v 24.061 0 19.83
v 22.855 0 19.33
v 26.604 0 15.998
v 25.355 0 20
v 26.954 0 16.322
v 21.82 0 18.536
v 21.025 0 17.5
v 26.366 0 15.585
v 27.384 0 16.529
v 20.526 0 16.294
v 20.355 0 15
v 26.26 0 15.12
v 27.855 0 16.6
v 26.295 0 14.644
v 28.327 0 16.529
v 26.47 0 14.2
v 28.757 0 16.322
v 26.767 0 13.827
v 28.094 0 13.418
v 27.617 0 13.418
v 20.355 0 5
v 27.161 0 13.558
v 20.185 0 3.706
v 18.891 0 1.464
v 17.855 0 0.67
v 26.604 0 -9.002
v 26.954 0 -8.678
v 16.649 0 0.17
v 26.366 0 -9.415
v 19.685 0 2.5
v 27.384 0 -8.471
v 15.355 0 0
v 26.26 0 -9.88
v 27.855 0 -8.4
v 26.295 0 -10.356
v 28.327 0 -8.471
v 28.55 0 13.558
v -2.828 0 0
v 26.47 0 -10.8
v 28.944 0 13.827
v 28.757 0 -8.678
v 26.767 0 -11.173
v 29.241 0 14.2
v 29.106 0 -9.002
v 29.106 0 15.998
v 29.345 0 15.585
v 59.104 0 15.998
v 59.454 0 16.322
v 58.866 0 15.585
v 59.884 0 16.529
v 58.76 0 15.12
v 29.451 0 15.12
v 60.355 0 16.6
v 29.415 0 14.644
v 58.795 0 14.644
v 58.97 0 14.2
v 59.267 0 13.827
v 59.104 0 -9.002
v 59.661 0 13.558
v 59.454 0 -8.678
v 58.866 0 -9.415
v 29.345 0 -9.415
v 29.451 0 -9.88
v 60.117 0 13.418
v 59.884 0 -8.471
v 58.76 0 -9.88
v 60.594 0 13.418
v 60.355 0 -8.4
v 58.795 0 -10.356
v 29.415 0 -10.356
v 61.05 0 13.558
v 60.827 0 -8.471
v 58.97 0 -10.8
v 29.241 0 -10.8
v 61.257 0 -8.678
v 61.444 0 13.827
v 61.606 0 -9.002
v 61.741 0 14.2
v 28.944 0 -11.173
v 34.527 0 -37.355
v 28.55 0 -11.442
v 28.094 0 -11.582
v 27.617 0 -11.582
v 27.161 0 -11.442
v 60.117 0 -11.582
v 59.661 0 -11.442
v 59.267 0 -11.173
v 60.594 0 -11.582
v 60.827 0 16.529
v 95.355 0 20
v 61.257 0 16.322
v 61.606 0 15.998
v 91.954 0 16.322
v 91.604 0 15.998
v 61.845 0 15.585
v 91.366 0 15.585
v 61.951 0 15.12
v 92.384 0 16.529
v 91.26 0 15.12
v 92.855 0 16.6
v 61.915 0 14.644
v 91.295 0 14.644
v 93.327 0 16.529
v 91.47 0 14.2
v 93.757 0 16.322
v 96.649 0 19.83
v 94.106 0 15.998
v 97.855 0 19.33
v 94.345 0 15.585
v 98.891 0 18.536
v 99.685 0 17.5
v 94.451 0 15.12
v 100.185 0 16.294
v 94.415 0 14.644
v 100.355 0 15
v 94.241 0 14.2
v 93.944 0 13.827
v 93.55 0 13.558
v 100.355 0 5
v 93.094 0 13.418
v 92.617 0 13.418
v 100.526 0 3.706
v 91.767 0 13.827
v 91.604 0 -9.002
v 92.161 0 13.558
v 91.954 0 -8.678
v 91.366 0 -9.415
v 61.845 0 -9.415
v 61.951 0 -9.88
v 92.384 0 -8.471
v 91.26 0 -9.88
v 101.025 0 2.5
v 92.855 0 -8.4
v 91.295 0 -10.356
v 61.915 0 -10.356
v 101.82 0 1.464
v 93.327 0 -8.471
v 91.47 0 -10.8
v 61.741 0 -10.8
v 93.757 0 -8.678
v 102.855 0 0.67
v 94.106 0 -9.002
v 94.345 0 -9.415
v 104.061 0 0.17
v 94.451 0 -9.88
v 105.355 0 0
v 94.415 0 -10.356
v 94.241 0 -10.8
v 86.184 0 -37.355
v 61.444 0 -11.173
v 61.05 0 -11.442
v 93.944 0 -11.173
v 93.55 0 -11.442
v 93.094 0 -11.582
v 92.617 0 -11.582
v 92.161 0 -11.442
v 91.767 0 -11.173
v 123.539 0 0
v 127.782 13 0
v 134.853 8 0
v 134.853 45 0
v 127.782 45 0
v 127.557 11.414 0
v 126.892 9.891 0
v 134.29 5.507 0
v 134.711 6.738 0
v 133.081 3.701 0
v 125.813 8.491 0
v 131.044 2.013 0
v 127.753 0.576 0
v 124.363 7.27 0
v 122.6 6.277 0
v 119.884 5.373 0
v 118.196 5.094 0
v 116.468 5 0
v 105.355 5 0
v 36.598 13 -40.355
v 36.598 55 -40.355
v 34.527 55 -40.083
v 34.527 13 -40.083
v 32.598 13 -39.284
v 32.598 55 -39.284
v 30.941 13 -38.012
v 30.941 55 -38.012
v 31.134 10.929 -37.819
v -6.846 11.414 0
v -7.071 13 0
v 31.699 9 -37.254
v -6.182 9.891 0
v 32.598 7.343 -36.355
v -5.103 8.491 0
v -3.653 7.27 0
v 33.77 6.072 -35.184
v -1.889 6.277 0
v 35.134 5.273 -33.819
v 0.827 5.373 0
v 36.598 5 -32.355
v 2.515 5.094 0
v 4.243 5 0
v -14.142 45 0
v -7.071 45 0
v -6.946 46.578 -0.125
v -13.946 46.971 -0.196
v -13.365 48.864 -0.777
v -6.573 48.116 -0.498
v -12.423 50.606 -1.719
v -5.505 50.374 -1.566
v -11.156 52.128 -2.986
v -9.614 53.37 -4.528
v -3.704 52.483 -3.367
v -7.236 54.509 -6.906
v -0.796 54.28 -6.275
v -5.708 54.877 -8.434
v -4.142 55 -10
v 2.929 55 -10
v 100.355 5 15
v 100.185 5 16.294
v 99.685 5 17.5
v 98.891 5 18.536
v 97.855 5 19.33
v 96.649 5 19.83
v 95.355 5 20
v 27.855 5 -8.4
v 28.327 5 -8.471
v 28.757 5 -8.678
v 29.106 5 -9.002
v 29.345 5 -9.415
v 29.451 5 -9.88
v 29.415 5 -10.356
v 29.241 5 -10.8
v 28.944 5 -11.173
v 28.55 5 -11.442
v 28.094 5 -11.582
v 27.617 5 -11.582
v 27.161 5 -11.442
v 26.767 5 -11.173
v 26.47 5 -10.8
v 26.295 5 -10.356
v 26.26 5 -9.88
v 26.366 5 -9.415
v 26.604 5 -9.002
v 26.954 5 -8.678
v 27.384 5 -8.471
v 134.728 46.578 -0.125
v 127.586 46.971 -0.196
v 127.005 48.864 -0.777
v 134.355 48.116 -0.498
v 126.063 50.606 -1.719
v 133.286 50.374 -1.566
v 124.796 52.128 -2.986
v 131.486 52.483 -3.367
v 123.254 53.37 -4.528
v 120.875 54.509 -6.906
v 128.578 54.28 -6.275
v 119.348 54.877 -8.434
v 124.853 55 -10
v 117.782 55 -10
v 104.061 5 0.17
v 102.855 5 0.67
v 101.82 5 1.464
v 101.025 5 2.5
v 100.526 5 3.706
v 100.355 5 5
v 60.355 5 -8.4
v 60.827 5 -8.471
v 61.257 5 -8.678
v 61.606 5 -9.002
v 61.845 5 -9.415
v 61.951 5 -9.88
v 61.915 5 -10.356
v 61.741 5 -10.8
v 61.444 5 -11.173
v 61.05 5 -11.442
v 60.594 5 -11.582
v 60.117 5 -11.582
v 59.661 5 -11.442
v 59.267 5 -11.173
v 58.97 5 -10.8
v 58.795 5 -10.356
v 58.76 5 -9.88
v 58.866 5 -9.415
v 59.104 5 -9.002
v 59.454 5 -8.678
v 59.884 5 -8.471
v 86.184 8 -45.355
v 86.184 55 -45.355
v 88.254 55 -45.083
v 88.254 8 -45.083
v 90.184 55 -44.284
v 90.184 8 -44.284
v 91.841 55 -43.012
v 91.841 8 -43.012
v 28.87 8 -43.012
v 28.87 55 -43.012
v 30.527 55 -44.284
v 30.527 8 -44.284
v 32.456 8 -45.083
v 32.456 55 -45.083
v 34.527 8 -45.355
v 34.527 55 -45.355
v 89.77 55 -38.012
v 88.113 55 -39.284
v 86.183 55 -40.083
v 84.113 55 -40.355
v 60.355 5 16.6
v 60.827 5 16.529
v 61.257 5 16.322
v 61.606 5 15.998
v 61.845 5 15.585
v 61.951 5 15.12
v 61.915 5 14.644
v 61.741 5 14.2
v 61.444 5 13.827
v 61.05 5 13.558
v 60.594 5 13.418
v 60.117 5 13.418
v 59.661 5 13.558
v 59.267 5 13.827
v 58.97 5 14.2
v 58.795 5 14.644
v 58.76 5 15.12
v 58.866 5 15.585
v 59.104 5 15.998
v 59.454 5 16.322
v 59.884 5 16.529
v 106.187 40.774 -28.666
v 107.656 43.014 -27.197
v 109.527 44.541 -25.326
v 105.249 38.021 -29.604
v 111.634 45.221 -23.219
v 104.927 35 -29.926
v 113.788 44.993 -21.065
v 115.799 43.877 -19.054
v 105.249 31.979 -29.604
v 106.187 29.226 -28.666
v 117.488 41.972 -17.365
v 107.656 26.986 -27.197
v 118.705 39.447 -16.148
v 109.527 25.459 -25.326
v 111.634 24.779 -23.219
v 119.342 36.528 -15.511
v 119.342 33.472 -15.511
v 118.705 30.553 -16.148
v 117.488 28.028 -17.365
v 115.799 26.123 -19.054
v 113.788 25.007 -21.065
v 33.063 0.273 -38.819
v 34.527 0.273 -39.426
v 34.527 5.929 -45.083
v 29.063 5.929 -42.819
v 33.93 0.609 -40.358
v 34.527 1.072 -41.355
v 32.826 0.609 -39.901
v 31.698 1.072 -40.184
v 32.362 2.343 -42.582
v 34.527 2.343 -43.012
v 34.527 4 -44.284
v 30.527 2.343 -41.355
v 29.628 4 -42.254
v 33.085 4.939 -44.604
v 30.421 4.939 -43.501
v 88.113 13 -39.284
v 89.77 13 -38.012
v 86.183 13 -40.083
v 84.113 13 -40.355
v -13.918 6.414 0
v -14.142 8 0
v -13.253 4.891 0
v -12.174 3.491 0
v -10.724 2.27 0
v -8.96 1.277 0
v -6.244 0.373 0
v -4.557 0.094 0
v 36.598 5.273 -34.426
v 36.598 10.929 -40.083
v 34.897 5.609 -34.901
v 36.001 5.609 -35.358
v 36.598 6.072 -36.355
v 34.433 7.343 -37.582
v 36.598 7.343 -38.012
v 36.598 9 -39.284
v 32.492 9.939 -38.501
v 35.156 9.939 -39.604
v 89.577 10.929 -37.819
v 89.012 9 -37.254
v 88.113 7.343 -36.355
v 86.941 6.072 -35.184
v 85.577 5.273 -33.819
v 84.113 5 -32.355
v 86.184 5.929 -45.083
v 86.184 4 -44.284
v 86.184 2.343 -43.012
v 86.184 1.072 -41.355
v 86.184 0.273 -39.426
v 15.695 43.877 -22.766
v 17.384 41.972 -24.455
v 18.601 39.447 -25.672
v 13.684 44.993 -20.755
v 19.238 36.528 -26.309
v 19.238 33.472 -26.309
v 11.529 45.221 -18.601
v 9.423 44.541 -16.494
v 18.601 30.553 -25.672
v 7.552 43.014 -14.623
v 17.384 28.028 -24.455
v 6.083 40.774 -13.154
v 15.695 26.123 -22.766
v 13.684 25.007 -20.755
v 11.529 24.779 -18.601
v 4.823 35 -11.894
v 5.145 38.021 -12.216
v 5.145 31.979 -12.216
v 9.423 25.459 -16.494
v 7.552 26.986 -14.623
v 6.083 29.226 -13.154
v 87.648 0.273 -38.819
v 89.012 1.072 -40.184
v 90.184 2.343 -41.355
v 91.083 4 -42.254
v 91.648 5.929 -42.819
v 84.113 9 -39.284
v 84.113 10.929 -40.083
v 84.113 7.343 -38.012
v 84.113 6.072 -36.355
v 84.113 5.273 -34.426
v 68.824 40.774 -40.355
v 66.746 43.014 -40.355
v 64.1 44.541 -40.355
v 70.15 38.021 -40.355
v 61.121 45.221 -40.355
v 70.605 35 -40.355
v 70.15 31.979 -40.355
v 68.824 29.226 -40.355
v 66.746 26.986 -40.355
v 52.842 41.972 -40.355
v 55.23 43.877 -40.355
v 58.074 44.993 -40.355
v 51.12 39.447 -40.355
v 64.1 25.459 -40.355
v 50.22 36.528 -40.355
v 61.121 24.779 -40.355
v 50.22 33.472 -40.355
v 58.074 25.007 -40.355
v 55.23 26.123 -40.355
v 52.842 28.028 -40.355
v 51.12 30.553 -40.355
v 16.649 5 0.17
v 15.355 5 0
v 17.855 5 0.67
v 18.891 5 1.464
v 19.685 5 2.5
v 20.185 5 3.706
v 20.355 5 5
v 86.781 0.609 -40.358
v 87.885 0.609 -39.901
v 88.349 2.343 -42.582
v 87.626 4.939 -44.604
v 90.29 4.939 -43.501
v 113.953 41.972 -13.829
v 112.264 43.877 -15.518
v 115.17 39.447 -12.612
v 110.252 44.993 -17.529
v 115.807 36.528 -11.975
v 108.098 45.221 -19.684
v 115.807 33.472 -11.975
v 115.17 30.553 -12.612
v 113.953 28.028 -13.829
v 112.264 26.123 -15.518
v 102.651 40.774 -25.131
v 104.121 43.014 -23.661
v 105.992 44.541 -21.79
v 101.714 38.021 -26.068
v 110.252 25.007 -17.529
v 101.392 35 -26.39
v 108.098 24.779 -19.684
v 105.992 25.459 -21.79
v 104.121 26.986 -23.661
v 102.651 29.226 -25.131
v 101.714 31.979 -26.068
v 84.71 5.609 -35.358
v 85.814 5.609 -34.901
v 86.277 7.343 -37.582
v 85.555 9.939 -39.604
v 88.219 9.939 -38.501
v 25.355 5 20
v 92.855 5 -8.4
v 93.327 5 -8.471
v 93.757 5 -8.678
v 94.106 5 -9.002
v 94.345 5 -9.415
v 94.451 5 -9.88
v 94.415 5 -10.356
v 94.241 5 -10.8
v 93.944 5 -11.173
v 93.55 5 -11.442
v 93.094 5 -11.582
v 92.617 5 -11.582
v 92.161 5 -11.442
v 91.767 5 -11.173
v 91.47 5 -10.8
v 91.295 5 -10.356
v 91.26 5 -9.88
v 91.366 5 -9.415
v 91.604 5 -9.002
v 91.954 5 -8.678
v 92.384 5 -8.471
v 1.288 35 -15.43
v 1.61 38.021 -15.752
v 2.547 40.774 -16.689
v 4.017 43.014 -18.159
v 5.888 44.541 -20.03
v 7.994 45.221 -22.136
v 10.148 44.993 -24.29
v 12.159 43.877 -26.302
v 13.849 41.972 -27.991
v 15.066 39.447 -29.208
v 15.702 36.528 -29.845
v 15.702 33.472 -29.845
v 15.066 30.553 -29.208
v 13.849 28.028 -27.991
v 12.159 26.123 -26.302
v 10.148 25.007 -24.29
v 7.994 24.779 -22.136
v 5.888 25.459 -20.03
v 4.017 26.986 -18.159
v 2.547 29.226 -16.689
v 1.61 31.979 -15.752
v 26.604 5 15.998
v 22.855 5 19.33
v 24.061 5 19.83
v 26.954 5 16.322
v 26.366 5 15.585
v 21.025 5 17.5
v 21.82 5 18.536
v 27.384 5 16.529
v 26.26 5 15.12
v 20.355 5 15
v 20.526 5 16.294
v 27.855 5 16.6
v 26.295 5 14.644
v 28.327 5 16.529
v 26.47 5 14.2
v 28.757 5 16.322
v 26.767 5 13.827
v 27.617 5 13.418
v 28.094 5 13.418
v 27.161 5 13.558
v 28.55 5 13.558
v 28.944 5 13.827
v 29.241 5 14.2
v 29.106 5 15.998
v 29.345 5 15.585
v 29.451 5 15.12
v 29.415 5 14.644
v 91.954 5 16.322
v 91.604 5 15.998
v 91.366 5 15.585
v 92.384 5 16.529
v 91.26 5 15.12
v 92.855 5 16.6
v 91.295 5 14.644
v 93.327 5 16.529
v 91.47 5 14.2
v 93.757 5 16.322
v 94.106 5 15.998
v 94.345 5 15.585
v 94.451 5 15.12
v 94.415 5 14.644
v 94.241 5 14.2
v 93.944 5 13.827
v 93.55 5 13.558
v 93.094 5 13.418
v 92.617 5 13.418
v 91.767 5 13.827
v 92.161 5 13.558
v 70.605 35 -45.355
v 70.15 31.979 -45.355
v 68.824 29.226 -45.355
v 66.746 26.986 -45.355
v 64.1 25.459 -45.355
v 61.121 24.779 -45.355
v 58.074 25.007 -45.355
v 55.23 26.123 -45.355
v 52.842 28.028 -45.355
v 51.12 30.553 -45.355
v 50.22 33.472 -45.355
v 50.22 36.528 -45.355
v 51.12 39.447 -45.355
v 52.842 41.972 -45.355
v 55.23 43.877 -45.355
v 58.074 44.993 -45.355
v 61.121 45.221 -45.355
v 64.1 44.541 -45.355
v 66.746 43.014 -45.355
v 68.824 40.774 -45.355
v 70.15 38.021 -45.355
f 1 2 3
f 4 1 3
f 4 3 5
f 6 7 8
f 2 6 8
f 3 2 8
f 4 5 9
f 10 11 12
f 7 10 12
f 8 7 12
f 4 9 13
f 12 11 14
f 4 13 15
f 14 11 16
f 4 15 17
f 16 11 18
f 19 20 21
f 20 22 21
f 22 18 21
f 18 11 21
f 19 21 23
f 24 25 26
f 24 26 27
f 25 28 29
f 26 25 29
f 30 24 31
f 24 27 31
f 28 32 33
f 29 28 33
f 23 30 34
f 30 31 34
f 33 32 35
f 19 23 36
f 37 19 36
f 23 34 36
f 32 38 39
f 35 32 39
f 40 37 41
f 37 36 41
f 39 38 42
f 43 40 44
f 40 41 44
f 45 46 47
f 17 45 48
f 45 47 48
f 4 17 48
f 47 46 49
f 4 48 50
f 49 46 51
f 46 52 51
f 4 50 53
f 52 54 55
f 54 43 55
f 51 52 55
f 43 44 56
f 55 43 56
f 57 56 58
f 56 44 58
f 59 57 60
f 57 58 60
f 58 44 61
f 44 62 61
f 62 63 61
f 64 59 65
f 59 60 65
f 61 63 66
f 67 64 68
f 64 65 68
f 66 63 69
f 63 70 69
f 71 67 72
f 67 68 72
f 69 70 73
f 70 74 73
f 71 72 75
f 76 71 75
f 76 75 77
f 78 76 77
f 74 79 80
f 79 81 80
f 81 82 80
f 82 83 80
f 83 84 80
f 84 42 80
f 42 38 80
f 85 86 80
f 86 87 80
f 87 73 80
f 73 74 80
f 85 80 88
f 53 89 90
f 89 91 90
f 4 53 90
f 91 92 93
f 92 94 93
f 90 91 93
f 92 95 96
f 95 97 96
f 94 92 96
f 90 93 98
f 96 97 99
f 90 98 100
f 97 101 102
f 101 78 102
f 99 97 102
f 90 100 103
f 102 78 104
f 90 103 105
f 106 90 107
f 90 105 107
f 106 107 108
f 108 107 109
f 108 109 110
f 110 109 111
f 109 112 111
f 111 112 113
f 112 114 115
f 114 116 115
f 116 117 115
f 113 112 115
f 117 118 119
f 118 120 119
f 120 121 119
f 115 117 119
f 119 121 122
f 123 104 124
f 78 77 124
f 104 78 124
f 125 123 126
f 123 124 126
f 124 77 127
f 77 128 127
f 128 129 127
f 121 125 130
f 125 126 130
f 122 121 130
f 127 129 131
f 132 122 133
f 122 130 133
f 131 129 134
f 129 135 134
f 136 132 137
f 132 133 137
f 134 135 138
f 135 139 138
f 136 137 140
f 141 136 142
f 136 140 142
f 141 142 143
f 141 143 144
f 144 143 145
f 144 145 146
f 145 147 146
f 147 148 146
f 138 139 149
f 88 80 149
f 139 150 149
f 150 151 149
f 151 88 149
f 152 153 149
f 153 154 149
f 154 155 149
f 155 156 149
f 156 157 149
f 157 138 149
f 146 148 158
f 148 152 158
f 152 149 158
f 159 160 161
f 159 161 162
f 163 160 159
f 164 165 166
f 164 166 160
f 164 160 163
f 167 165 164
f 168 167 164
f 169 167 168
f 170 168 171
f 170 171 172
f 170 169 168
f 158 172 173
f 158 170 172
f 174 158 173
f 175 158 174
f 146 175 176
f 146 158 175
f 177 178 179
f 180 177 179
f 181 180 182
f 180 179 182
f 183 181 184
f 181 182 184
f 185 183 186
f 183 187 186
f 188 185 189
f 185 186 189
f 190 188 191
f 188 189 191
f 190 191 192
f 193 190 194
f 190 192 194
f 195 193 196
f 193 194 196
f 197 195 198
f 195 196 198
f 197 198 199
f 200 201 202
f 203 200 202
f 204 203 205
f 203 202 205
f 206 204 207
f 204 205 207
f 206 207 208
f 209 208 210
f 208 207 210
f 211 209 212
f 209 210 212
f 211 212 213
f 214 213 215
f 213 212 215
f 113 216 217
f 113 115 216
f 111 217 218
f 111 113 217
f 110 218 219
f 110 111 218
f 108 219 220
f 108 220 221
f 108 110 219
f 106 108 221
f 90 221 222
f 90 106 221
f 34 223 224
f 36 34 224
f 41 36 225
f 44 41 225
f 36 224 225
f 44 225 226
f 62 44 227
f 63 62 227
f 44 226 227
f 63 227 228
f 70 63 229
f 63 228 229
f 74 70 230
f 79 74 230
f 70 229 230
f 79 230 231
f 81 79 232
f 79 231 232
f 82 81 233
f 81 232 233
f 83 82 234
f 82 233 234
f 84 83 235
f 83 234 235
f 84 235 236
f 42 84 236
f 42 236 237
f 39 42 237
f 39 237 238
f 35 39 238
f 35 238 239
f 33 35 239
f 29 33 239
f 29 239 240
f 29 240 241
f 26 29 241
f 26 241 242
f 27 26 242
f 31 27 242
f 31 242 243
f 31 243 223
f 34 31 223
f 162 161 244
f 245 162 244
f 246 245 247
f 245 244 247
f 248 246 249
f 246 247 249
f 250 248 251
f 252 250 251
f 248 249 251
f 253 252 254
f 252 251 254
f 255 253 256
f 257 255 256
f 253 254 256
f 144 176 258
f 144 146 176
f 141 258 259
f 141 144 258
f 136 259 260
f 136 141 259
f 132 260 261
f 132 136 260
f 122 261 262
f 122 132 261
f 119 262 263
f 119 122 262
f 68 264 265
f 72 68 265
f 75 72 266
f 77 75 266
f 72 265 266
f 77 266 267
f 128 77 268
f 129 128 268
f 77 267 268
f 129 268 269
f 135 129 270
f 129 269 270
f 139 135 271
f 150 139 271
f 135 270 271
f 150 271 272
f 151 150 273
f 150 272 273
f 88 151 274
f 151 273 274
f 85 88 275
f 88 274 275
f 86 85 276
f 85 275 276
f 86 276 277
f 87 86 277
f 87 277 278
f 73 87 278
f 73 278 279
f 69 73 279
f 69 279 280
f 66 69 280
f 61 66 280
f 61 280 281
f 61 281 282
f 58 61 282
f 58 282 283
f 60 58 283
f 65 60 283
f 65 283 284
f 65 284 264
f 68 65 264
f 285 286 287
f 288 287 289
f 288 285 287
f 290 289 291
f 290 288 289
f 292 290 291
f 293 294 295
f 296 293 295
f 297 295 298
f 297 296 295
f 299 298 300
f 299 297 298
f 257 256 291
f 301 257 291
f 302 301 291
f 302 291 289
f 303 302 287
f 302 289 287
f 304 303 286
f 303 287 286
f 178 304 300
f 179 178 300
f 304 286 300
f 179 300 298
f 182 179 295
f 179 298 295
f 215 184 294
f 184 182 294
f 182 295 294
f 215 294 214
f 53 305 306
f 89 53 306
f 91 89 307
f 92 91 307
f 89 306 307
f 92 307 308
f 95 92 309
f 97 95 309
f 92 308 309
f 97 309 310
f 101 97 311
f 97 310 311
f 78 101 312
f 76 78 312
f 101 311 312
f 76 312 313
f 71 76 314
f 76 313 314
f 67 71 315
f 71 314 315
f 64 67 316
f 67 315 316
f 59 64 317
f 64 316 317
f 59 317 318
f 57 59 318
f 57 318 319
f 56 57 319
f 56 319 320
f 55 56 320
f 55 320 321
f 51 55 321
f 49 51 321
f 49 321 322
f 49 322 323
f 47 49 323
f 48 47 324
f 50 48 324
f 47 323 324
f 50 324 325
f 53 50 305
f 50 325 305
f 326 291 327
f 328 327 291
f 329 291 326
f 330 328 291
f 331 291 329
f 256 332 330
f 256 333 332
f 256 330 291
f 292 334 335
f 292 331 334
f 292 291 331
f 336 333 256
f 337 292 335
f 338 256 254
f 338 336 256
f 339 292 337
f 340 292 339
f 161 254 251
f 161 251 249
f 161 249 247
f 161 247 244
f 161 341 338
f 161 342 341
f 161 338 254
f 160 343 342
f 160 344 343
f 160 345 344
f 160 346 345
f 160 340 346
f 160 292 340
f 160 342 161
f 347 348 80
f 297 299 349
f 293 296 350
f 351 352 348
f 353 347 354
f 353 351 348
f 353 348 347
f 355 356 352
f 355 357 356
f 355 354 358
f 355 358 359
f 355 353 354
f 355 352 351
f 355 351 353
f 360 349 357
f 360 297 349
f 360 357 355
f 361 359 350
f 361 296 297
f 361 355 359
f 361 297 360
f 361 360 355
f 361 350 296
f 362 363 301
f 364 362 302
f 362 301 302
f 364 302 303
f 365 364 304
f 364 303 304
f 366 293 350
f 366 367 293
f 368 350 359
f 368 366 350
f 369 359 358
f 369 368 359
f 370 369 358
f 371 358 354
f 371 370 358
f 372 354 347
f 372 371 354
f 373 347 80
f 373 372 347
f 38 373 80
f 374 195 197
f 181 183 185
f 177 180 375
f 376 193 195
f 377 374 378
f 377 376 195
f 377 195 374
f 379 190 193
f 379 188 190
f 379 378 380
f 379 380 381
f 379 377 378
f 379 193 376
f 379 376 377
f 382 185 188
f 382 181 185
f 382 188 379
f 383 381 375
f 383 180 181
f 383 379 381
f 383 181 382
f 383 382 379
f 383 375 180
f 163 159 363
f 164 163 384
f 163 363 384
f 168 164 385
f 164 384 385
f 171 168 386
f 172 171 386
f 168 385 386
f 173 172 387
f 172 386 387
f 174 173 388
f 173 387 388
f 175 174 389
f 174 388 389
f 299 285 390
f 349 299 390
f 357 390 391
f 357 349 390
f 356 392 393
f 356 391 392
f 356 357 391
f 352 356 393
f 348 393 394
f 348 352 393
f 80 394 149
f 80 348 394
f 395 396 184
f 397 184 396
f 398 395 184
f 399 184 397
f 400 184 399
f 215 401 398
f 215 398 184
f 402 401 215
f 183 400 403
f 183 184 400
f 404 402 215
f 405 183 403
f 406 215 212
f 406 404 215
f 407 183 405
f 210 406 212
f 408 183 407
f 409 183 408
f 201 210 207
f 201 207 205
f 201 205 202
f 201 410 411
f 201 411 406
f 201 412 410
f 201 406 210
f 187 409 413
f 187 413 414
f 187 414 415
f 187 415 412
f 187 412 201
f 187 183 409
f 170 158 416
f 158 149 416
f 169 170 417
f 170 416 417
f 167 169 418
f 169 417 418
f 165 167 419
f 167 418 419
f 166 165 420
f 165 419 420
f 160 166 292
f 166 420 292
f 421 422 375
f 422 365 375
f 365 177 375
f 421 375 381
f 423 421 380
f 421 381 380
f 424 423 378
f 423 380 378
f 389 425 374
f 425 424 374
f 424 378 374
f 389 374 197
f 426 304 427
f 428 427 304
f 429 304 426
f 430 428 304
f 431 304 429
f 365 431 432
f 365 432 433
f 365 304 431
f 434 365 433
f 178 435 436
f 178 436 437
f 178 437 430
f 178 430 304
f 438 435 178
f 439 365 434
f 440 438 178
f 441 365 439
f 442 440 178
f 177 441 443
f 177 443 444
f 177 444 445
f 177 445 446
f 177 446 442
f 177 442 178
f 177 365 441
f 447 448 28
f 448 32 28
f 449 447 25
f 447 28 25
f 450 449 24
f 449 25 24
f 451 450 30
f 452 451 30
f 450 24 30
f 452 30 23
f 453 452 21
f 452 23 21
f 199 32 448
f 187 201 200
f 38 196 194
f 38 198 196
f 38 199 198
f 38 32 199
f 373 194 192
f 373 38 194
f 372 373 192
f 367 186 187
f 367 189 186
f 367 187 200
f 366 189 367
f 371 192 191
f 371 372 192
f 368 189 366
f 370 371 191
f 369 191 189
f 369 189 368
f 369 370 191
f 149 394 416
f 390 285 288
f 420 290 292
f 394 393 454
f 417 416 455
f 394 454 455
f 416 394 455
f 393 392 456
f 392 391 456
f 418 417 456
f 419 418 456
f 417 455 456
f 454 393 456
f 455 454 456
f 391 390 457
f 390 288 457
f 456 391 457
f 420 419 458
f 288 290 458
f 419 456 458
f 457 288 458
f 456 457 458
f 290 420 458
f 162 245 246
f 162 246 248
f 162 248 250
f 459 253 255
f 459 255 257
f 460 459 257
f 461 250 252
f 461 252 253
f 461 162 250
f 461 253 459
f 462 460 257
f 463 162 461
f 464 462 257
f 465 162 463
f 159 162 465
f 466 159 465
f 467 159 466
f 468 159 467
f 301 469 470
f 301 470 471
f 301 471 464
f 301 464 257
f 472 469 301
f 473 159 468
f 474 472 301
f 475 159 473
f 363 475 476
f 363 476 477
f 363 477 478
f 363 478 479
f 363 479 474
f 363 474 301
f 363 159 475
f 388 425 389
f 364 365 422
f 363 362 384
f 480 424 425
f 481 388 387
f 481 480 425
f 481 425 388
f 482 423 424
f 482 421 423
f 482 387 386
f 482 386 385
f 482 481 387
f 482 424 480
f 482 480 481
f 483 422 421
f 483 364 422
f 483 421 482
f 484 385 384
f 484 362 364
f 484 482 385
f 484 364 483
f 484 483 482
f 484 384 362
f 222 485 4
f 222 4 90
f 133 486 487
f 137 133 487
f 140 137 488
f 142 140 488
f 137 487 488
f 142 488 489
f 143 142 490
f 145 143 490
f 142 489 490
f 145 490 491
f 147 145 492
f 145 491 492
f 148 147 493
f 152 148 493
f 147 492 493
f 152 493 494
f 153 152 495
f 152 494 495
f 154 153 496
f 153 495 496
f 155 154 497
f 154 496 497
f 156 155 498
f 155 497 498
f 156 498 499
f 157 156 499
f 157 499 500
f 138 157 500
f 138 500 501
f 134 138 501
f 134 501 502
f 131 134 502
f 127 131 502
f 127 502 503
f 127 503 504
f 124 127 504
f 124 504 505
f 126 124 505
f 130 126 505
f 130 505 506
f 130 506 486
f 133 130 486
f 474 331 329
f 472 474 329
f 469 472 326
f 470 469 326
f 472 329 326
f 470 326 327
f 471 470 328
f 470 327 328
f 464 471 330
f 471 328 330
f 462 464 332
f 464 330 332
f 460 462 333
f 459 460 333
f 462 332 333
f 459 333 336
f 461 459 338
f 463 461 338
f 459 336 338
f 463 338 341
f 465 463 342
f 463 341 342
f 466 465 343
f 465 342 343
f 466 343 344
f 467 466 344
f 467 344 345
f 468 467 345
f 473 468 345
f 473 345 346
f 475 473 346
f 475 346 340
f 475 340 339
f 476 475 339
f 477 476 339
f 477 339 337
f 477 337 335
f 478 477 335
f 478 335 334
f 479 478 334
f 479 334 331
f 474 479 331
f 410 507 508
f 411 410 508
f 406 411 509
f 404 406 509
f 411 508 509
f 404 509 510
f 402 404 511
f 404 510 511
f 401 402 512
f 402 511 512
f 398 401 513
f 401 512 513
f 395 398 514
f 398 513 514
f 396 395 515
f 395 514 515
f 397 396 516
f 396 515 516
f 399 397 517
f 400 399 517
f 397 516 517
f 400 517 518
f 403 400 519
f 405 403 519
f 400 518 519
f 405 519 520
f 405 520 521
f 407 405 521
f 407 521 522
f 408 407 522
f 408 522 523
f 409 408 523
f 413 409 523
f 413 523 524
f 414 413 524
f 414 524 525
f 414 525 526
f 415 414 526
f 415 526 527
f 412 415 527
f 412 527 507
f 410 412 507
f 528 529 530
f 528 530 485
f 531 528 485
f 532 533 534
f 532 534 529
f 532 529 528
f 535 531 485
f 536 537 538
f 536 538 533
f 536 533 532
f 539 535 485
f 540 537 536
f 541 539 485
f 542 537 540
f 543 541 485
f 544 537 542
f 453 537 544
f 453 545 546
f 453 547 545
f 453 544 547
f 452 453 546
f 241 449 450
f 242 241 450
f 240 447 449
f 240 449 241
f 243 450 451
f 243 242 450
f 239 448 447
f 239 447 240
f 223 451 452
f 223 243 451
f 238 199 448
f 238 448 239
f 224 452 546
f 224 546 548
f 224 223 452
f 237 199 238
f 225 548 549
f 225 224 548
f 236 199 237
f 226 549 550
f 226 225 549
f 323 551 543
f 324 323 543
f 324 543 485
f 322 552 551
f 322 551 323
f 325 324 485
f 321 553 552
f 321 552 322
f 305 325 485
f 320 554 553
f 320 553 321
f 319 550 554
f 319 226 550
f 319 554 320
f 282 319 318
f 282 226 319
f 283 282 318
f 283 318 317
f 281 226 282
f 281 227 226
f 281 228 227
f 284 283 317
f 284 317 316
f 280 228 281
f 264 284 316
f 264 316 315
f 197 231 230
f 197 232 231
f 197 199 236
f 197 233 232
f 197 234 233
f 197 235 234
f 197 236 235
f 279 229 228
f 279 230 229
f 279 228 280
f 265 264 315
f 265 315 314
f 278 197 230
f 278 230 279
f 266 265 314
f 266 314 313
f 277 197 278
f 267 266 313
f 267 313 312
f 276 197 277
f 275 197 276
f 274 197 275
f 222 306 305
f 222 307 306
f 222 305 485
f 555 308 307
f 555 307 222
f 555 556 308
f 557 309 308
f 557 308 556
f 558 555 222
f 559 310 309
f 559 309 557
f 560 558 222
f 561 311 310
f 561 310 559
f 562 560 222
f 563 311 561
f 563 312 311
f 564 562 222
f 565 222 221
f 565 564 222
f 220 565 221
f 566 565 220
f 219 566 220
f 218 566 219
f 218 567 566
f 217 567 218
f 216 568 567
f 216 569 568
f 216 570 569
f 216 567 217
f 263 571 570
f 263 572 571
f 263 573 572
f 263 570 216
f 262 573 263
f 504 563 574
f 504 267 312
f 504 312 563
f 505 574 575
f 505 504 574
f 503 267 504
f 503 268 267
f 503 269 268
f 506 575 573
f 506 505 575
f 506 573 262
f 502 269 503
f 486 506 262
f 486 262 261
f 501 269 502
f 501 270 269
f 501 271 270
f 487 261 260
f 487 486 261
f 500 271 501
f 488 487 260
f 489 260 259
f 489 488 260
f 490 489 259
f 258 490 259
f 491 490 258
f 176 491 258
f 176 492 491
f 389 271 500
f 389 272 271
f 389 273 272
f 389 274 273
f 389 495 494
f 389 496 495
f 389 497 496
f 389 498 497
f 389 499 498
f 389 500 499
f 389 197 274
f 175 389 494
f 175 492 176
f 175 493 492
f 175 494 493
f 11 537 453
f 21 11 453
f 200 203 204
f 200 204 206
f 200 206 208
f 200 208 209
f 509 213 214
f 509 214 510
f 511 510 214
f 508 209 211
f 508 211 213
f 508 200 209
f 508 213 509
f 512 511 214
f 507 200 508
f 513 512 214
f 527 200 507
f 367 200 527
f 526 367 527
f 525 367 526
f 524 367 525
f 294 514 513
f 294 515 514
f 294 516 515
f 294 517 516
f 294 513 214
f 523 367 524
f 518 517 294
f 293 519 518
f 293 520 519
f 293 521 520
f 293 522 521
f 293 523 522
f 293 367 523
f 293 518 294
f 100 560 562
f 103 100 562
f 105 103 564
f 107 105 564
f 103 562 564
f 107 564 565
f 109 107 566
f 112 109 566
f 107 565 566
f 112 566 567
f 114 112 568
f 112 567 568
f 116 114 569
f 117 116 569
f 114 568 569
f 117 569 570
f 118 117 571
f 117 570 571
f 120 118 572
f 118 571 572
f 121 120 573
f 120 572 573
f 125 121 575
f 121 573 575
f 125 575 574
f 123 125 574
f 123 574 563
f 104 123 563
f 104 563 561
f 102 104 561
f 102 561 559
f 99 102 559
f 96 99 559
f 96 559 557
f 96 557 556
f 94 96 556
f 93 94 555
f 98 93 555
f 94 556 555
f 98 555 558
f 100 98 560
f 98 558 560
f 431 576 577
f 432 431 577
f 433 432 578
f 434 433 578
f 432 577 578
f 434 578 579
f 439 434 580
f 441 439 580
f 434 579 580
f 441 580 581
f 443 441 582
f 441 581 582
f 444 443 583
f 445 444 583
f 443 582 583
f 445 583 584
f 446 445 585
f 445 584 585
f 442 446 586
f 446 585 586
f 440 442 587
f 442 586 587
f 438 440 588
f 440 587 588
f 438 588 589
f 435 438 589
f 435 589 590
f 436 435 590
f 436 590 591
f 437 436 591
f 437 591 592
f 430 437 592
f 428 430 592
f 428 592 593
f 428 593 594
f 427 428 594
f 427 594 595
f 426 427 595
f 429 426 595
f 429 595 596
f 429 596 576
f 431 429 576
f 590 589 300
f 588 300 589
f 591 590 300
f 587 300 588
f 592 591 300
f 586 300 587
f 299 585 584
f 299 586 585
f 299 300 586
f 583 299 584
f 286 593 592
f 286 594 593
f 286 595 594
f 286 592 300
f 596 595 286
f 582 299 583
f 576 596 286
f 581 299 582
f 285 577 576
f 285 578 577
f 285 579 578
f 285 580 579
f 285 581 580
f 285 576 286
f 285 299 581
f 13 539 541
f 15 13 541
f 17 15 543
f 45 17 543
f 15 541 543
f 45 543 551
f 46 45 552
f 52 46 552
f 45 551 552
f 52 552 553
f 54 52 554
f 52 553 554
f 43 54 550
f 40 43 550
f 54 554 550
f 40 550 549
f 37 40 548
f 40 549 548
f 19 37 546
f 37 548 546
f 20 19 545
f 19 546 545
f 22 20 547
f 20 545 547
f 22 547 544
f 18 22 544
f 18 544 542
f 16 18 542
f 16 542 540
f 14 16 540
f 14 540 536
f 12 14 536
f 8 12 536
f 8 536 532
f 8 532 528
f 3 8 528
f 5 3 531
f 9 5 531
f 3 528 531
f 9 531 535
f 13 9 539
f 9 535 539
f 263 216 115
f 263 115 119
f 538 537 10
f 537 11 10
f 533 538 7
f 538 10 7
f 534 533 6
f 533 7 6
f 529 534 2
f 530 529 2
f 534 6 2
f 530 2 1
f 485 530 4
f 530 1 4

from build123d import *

# Parameters (mm, degrees)
BOSS_EXTRUDE1_DEPTH = 5
BOSS_EXTRUDE2_DEPTH = 50
CUT_EXTRUDE1_DEPTH  = 10
SKETCH6_R           = 10.25
CUT_EXTRUDE2_DEPTH  = 10
SKETCH7_R           = 10.25
CUT_EXTRUDE3_DEPTH  = 10
SKETCH8_R           = 1.6
CUT_EXTRUDE4_DEPTH  = 10
FILLET1_R           = 8
SKETCH10_W          = 80
SKETCH10_H          = 20
SKETCH10_R          = 1.6
BOSS_EXTRUDE5_DEPTH = 5
FILLET4_R           = 5
FILLET5_R           = 10


with BuildPart() as part:
    # Sketch2 → Boss-Extrude1 (new body)
    with BuildSketch(Plane(origin=(0, 0, 0), x_dir=(1, 0, 0), z_dir=(0, 1, 0))):
        Polygon((-14.142135624, 0), (0, 0), (35.355339059, 35.355339059), (85.355339059, 35.355339059), (120.710678119, 0), (134.852813742, 0), (89.497474683, 45.355339059), (31.213203436, 45.355339059), align=None)
        Polygon((85.355339059, 35.355339059), (35.355339059, 35.355339059), (0, 0), (120.710678119, 0), align=None)
    extrude(amount=BOSS_EXTRUDE1_DEPTH)

    # Sketch3 → Boss-Extrude2 (add)
    with BuildSketch(Plane(origin=(0, 5, 0), x_dir=(1, 0, 0), z_dir=(0, 1, 0))):
        Polygon((-14.142135624, 0), (31.213203436, 45.355339059), (89.497474683, 45.355339059), (134.852813742, 0), (127.781745931, 0), (87.426406871, 40.355339059), (33.284271247, 40.355339059), (-7.071067812, 0), align=None)
    extrude(amount=BOSS_EXTRUDE2_DEPTH)

    # Sketch5 → Cut-Extrude1 (cut)
    with BuildSketch(Plane(origin=(0, 0, -45.355339059), x_dir=(-1, 0, 0), z_dir=(0, 0, -1))):
        with BuildLine():
            ThreePointArc((-50.105339059, 35), (-60.355339059, 45.25), (-70.605339059, 35))
            Line((-70.605339059, 35), (-50.105339059, 35))
        make_face()
        with BuildLine():
            Line((-50.105339059, 35), (-70.605339059, 35))
            ThreePointArc((-70.605339059, 35), (-60.355339059, 24.75), (-50.105339059, 35))
        make_face()
    extrude(amount=-CUT_EXTRUDE1_DEPTH, mode=Mode.SUBTRACT)

    # Sketch6 → Cut-Extrude2 (cut)
    with BuildSketch(Plane(origin=(67.426406871, 0, -67.426406871), x_dir=(-0.7071067811865509, 0, -0.7071067811865441), z_dir=(0.7071067811865441, 0, -0.7071067811865509))):
        with Locations((-63.284271247, 35)):
            Circle(SKETCH6_R)
    extrude(amount=-CUT_EXTRUDE2_DEPTH, mode=Mode.SUBTRACT)

    # Sketch7 → Cut-Extrude3 (cut)
    with BuildSketch(Plane(origin=(-7.071067812, 0, -7.071067812), x_dir=(-0.7071067811865513, 0, 0.7071067811865438), z_dir=(-0.7071067811865438, 0, -0.7071067811865513))):
        with Locations((-22.071067812, 35)):
            Circle(SKETCH7_R)
    extrude(amount=-CUT_EXTRUDE3_DEPTH, mode=Mode.SUBTRACT)

    # Sketch8 → Cut-Extrude4 (cut)
    with BuildSketch(Plane(origin=(0, 5, 0), x_dir=(1, 0, 0), z_dir=(0, 1, 0))):
        with Locations(Location((60.355339059, 10, 0), (0, 0, 270))):
            Circle(SKETCH8_R)
        with Locations(Location((92.855339059, 10, 0), (0, 0, 270))):
            Circle(SKETCH8_R)
        with Locations(Location((27.855339059, 10, 0), (0, 0, 270))):
            Circle(SKETCH8_R)
    extrude(amount=-CUT_EXTRUDE4_DEPTH, mode=Mode.SUBTRACT)

    # Fillet1
    fillet1_edges = [part.edges().sort_by_distance(p)[0] for p in [
        (13.106601718, 5, -20.17766953),
        (60.355339059, 5, -40.355339059),
        (33.284271247, 30, -40.355339059),
        (107.604076401, 5, -20.17766953),
        (87.426406871, 30, -40.355339059),
        (60.355339059, 0, -45.355339059),
        (112.175144213, 0, -22.67766953),
        (8.535533906, 0, -22.67766953),
        (31.213203436, 27.5, -45.355339059),
        (89.497474683, 27.5, -45.355339059),
    ]]
    fillet(fillet1_edges, radius=FILLET1_R)

    # Sketch10 → Boss-Extrude5 (add)
    with BuildSketch(Plane(origin=(0, 5, 0), x_dir=(1, 0, 0), z_dir=(0, 1, 0))):
        with Locations((60.355339059, -10)):
            Rectangle(SKETCH10_W, SKETCH10_H)
        with Locations(Location((60.355339059, -15, 0), (0, 0, 270))):
            Circle(SKETCH10_R, mode=Mode.SUBTRACT)
        with Locations(Location((92.855339059, -15, 0), (0, 0, 270))):
            Circle(SKETCH10_R, mode=Mode.SUBTRACT)
        with Locations(Location((27.855339059, -15, 0), (0, 0, 270))):
            Circle(SKETCH10_R, mode=Mode.SUBTRACT)
    extrude(amount=-BOSS_EXTRUDE5_DEPTH)

    # Fillet4
    fillet4_edges = [part.edges().sort_by_distance(p)[0] for p in [
        (100.355339059, 2.5, 20),
        (100.355339059, 2.5, 0),
        (20.355339059, 2.5, 0),
        (20.355339059, 2.5, 20),
    ]]
    fillet(fillet4_edges, radius=FILLET4_R)

    # Fillet5
    # the kernel refuses this fillet: 10 mm, written as the material it takes off along each edge
    with BuildSketch(Plane(origin=(17.928932188, 55, 0), x_dir=(0, -1, 0), z_dir=(-1, 0, 0))) as fillet5_piece_1:
        with BuildLine():
            CenterArc((FILLET5_R, -FILLET5_R), FILLET5_R, 90, 90)
            Line((0, -FILLET5_R), (0, 0))
            Line((0, 0), (FILLET5_R, 0))
        make_face()
    extrude(amount=57.071067812, mode=Mode.SUBTRACT)
    with BuildSketch(Plane(origin=(159.852813742, 55, 0), x_dir=(0, 0, -1), z_dir=(-1, 0, 0))) as fillet5_piece_2:
        with BuildLine():
            CenterArc((FILLET5_R, FILLET5_R), FILLET5_R, 180, 90)
            Line((0, FILLET5_R), (0, 0))
            Line((0, 0), (FILLET5_R, 0))
        make_face()
    extrude(amount=57.071067812, mode=Mode.SUBTRACT)


solid = part.part
